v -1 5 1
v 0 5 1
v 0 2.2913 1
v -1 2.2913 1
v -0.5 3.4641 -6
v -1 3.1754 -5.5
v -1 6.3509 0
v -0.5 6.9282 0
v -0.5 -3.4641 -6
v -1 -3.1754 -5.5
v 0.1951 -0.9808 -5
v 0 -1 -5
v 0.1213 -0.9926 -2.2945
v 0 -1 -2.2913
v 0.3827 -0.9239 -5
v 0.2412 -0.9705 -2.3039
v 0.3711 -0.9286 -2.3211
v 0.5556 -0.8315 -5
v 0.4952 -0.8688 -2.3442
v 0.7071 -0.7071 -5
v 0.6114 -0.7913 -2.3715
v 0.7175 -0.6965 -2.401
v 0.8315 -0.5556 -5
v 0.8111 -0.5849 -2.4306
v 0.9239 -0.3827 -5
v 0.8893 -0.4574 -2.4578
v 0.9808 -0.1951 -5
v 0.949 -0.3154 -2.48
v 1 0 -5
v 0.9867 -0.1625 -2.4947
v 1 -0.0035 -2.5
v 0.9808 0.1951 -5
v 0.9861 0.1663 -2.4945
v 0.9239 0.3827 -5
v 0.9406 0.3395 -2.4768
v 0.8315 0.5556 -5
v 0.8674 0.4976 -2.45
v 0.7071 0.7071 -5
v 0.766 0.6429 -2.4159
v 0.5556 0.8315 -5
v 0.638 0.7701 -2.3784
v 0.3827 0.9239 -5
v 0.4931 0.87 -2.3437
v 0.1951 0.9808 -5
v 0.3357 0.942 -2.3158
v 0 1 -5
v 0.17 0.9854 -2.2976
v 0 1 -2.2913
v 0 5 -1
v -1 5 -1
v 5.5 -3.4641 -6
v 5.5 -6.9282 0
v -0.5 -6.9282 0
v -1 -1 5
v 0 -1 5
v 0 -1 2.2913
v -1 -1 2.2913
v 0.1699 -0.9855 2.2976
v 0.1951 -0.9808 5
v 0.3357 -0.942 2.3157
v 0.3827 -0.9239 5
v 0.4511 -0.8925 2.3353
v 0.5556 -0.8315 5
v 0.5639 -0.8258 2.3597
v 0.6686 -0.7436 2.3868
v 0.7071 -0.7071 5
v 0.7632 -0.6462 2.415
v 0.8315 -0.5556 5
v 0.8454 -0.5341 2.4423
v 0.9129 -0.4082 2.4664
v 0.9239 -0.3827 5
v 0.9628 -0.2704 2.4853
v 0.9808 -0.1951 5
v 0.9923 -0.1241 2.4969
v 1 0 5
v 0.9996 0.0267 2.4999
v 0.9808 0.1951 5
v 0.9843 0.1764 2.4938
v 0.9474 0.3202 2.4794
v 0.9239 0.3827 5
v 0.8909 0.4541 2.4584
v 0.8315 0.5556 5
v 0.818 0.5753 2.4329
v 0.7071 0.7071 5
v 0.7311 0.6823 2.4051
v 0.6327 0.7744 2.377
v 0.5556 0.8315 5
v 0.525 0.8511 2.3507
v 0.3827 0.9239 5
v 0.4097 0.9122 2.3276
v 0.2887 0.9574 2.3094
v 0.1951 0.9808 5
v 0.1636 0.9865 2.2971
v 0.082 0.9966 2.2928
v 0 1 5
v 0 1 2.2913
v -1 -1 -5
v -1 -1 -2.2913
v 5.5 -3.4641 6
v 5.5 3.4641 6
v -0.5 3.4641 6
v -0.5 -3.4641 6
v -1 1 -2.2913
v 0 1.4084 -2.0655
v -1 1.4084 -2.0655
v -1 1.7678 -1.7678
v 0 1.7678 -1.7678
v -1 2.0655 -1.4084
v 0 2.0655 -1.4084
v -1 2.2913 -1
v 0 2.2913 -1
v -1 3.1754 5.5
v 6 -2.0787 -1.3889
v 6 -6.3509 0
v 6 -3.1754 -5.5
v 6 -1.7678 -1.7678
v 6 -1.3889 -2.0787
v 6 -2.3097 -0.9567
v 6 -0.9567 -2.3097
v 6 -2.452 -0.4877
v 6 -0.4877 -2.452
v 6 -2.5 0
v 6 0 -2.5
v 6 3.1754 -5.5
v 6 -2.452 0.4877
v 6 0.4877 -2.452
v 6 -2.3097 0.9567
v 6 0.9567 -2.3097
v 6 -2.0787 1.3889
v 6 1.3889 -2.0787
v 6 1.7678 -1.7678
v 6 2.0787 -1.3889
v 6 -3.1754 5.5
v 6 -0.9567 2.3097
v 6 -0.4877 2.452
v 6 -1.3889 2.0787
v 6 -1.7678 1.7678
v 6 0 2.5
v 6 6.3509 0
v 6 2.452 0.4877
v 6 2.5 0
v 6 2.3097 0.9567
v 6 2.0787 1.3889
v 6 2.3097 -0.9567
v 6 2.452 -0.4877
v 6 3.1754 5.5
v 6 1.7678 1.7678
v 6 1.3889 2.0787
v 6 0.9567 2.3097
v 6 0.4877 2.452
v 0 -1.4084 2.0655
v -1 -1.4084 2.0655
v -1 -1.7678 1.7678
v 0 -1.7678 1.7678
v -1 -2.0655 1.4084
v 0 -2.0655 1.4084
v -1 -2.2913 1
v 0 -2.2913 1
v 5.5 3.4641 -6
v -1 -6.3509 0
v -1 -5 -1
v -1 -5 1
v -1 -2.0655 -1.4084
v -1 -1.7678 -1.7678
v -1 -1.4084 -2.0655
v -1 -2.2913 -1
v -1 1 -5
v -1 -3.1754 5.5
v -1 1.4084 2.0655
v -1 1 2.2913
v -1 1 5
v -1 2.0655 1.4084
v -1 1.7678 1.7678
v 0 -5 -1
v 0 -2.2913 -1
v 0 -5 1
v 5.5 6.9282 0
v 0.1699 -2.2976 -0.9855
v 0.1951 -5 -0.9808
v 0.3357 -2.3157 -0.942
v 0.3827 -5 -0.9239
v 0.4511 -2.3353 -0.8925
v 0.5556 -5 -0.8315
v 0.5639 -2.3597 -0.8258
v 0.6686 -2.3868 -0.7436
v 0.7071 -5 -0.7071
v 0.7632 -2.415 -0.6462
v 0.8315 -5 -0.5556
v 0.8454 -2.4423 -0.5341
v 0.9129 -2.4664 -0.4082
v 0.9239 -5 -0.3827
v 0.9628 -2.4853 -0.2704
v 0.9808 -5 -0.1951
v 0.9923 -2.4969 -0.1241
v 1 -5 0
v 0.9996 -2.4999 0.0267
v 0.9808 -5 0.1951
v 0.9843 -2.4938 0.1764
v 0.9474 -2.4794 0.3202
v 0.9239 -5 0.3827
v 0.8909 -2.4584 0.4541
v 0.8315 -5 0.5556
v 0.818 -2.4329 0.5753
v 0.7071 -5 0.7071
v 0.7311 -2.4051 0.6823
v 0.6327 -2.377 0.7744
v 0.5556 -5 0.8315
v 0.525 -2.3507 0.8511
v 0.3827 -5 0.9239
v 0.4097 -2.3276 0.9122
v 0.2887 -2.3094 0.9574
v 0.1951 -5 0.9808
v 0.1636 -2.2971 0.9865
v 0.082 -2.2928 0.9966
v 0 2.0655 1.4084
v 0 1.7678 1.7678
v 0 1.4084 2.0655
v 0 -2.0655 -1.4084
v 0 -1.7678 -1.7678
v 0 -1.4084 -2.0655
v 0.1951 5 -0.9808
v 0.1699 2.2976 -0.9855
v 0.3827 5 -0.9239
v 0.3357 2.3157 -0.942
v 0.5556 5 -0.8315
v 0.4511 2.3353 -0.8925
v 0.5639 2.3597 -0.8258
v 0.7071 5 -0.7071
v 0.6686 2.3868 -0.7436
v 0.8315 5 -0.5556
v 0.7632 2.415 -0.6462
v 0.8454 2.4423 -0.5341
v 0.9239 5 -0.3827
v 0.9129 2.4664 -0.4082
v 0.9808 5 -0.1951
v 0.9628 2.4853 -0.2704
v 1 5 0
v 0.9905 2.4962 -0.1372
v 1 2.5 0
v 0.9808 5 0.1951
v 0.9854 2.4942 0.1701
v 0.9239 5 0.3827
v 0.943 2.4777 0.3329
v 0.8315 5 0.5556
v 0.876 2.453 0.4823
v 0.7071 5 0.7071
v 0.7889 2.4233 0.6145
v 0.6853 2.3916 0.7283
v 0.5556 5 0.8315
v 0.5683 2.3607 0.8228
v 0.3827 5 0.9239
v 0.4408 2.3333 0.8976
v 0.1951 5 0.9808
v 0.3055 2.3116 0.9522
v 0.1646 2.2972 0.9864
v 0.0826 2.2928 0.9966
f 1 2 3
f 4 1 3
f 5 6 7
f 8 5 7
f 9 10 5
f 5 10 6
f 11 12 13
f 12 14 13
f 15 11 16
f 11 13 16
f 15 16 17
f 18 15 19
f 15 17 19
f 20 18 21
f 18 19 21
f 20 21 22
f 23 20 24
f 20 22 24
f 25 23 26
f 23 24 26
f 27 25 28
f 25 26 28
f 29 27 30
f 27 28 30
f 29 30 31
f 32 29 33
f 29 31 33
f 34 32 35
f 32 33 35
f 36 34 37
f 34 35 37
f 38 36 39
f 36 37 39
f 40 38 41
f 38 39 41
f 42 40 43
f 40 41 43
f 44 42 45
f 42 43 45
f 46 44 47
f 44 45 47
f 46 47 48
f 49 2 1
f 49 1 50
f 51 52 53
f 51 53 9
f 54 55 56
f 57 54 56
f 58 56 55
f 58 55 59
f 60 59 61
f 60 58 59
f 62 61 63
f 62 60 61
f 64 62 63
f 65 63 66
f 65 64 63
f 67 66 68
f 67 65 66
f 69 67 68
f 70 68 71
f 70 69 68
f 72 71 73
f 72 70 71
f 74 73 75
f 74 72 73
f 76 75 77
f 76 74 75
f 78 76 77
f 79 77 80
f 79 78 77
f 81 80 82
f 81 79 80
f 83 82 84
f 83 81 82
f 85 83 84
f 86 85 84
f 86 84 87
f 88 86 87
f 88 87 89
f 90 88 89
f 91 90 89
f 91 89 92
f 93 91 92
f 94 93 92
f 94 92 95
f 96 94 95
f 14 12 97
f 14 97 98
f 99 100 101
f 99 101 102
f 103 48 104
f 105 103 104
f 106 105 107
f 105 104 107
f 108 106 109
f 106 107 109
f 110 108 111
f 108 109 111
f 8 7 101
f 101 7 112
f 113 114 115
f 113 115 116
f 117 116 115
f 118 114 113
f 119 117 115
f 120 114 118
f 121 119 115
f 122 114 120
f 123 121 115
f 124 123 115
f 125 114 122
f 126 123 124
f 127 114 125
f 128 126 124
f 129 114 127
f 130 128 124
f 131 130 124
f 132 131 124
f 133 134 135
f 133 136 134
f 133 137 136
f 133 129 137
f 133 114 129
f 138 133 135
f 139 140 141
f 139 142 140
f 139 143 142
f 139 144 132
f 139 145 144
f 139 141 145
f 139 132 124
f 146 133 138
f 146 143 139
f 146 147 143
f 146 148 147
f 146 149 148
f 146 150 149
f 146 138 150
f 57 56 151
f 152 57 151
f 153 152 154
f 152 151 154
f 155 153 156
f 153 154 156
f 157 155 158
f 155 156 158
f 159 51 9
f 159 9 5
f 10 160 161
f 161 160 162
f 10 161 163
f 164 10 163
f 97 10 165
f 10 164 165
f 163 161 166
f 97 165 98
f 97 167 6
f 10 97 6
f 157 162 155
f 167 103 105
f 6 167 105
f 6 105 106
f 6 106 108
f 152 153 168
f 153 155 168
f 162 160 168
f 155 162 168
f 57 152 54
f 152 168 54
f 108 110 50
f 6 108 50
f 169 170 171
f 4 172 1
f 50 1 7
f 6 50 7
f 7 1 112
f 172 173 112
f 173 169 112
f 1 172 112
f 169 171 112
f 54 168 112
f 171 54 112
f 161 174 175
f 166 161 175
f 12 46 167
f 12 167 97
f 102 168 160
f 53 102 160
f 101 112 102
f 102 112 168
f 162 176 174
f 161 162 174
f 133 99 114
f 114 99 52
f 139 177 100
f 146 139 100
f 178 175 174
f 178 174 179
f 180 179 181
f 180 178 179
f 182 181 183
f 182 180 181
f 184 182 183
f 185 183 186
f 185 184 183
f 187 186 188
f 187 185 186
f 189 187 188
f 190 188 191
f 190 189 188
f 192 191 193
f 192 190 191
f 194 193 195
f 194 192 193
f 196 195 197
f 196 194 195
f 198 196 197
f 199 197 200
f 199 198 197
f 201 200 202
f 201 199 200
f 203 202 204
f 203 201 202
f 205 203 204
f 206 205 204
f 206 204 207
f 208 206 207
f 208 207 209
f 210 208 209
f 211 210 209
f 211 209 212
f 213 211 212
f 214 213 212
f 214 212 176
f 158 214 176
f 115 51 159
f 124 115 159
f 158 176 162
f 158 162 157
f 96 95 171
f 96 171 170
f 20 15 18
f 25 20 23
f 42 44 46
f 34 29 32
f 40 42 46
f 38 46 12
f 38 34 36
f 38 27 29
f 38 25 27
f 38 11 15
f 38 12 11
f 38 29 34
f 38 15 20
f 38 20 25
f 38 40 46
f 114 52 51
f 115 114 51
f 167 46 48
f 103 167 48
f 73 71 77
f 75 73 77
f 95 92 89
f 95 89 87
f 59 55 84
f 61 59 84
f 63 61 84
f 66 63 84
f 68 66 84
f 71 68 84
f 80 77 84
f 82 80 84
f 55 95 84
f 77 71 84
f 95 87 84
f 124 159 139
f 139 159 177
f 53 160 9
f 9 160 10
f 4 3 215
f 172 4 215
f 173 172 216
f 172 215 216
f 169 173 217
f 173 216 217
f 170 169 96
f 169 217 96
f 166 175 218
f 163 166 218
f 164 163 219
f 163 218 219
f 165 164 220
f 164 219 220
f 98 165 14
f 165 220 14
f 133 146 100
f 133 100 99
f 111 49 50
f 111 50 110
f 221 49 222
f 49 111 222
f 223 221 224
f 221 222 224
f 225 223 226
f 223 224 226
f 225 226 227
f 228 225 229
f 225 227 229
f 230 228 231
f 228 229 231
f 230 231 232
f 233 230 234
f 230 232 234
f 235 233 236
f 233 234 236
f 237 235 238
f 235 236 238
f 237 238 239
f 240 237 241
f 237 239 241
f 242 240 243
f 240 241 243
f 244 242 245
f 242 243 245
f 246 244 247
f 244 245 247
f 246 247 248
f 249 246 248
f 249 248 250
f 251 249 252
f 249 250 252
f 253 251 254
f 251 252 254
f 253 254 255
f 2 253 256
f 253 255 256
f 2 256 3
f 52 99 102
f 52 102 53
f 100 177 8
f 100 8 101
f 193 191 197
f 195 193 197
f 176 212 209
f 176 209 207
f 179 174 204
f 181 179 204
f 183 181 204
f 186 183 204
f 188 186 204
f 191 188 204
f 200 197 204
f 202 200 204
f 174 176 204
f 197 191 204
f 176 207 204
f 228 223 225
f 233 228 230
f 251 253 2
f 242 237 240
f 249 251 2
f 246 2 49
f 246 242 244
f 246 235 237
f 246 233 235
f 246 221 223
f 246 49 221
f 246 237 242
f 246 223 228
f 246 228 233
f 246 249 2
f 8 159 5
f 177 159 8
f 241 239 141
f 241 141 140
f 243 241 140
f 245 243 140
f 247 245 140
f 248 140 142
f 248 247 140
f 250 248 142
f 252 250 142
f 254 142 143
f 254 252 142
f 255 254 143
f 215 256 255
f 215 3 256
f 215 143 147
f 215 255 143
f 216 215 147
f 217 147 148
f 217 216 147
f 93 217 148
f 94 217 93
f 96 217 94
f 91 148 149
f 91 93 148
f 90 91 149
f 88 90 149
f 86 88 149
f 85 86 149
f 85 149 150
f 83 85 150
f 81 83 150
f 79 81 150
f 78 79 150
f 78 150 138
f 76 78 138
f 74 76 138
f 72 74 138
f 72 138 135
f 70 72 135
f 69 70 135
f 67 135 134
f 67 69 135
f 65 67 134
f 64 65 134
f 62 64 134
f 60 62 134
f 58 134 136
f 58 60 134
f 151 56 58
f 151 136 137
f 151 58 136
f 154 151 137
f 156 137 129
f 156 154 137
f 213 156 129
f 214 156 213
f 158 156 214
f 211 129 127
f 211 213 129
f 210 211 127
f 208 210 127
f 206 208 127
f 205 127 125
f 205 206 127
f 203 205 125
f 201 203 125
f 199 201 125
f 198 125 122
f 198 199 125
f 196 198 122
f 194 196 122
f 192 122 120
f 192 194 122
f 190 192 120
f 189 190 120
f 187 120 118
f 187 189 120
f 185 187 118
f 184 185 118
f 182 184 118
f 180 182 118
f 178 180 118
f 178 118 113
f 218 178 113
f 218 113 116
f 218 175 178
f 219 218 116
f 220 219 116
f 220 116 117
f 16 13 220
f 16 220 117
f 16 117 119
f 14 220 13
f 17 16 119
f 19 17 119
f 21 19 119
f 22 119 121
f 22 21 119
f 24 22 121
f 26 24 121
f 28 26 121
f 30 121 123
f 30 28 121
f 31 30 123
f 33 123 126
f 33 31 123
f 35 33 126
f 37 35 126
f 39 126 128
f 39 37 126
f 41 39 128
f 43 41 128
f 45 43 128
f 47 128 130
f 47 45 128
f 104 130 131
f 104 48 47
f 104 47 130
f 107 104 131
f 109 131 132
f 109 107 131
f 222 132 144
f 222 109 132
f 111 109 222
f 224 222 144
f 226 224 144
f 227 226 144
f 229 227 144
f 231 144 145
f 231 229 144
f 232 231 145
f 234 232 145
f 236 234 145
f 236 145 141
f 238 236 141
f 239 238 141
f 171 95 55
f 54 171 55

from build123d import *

# Parameters (mm, degrees)
F0_R     = 2.5
F3_DEPTH = 6
F1_R     = 1
F4_DEPTH = 5
F5_DEPTH = 5
F2_R     = 1
F6_DEPTH = 5
F7_DEPTH = 5
F8_SIZE  = 0.5
F9_DEPTH = 1
F10_SIZE = 0.5


with BuildPart() as f3:
    # F0 (on Right) → F3 (new body)
    with BuildSketch(Plane.YZ):
        Polygon((3.4641016151, 6), (-3.4641016151, 6), (-6.9282032303, 0), (-3.4641016151, -6), (3.4641016151, -6), (6.9282032303, 0), align=None)
        Circle(F0_R, mode=Mode.SUBTRACT)
    extrude(amount=F3_DEPTH)

    # F1 (on Front) → F4 (cut)
    with BuildSketch(Plane.XZ):
        Circle(F1_R)
    extrude(amount=-F4_DEPTH, mode=Mode.SUBTRACT)

    # F1 (on Front) → F5 (cut)
    with BuildSketch(Plane.XZ):
        Circle(F1_R)
    extrude(amount=F5_DEPTH, mode=Mode.SUBTRACT)

    # F2 (on Top) → F6 (cut)
    with BuildSketch(Plane.XY):
        Circle(F2_R)
    extrude(amount=-F6_DEPTH, mode=Mode.SUBTRACT)

    # F2 (on Top) → F7 (cut)
    with BuildSketch(Plane.XY):
        Circle(F2_R)
    extrude(amount=F7_DEPTH, mode=Mode.SUBTRACT)

    # F8
    f8_edges = [f3.edges().sort_by_distance(p)[0] for p in [
        (6, 0, -6),
        (6, 5.196152, -3),
        (6, 5.196152, 3),
        (6, 0, 6),
        (6, -5.196152, 3),
        (6, -5.196152, -3),
    ]]
    chamfer(f8_edges, length=F8_SIZE)

    # F9 (add): a face of the model
    f9_faces = [f3.faces().sort_by_distance(p)[0] for p in [
        (0, 5.037407344, 2.9083484861),
    ]]
    extrude(f9_faces, amount=F9_DEPTH)

    # F10
    f10_edges = [f3.edges().sort_by_distance(p)[0] for p in [
        (-1, -5.196152, -3),
        (-1, 5.196152, -3),
        (-1, 0, -6),
        (-1, 0, 6),
        (-1, 5.196152, 3),
        (-1, -5.196152, 3),
    ]]
    chamfer(f10_edges, length=F10_SIZE)


solid = f3.part
